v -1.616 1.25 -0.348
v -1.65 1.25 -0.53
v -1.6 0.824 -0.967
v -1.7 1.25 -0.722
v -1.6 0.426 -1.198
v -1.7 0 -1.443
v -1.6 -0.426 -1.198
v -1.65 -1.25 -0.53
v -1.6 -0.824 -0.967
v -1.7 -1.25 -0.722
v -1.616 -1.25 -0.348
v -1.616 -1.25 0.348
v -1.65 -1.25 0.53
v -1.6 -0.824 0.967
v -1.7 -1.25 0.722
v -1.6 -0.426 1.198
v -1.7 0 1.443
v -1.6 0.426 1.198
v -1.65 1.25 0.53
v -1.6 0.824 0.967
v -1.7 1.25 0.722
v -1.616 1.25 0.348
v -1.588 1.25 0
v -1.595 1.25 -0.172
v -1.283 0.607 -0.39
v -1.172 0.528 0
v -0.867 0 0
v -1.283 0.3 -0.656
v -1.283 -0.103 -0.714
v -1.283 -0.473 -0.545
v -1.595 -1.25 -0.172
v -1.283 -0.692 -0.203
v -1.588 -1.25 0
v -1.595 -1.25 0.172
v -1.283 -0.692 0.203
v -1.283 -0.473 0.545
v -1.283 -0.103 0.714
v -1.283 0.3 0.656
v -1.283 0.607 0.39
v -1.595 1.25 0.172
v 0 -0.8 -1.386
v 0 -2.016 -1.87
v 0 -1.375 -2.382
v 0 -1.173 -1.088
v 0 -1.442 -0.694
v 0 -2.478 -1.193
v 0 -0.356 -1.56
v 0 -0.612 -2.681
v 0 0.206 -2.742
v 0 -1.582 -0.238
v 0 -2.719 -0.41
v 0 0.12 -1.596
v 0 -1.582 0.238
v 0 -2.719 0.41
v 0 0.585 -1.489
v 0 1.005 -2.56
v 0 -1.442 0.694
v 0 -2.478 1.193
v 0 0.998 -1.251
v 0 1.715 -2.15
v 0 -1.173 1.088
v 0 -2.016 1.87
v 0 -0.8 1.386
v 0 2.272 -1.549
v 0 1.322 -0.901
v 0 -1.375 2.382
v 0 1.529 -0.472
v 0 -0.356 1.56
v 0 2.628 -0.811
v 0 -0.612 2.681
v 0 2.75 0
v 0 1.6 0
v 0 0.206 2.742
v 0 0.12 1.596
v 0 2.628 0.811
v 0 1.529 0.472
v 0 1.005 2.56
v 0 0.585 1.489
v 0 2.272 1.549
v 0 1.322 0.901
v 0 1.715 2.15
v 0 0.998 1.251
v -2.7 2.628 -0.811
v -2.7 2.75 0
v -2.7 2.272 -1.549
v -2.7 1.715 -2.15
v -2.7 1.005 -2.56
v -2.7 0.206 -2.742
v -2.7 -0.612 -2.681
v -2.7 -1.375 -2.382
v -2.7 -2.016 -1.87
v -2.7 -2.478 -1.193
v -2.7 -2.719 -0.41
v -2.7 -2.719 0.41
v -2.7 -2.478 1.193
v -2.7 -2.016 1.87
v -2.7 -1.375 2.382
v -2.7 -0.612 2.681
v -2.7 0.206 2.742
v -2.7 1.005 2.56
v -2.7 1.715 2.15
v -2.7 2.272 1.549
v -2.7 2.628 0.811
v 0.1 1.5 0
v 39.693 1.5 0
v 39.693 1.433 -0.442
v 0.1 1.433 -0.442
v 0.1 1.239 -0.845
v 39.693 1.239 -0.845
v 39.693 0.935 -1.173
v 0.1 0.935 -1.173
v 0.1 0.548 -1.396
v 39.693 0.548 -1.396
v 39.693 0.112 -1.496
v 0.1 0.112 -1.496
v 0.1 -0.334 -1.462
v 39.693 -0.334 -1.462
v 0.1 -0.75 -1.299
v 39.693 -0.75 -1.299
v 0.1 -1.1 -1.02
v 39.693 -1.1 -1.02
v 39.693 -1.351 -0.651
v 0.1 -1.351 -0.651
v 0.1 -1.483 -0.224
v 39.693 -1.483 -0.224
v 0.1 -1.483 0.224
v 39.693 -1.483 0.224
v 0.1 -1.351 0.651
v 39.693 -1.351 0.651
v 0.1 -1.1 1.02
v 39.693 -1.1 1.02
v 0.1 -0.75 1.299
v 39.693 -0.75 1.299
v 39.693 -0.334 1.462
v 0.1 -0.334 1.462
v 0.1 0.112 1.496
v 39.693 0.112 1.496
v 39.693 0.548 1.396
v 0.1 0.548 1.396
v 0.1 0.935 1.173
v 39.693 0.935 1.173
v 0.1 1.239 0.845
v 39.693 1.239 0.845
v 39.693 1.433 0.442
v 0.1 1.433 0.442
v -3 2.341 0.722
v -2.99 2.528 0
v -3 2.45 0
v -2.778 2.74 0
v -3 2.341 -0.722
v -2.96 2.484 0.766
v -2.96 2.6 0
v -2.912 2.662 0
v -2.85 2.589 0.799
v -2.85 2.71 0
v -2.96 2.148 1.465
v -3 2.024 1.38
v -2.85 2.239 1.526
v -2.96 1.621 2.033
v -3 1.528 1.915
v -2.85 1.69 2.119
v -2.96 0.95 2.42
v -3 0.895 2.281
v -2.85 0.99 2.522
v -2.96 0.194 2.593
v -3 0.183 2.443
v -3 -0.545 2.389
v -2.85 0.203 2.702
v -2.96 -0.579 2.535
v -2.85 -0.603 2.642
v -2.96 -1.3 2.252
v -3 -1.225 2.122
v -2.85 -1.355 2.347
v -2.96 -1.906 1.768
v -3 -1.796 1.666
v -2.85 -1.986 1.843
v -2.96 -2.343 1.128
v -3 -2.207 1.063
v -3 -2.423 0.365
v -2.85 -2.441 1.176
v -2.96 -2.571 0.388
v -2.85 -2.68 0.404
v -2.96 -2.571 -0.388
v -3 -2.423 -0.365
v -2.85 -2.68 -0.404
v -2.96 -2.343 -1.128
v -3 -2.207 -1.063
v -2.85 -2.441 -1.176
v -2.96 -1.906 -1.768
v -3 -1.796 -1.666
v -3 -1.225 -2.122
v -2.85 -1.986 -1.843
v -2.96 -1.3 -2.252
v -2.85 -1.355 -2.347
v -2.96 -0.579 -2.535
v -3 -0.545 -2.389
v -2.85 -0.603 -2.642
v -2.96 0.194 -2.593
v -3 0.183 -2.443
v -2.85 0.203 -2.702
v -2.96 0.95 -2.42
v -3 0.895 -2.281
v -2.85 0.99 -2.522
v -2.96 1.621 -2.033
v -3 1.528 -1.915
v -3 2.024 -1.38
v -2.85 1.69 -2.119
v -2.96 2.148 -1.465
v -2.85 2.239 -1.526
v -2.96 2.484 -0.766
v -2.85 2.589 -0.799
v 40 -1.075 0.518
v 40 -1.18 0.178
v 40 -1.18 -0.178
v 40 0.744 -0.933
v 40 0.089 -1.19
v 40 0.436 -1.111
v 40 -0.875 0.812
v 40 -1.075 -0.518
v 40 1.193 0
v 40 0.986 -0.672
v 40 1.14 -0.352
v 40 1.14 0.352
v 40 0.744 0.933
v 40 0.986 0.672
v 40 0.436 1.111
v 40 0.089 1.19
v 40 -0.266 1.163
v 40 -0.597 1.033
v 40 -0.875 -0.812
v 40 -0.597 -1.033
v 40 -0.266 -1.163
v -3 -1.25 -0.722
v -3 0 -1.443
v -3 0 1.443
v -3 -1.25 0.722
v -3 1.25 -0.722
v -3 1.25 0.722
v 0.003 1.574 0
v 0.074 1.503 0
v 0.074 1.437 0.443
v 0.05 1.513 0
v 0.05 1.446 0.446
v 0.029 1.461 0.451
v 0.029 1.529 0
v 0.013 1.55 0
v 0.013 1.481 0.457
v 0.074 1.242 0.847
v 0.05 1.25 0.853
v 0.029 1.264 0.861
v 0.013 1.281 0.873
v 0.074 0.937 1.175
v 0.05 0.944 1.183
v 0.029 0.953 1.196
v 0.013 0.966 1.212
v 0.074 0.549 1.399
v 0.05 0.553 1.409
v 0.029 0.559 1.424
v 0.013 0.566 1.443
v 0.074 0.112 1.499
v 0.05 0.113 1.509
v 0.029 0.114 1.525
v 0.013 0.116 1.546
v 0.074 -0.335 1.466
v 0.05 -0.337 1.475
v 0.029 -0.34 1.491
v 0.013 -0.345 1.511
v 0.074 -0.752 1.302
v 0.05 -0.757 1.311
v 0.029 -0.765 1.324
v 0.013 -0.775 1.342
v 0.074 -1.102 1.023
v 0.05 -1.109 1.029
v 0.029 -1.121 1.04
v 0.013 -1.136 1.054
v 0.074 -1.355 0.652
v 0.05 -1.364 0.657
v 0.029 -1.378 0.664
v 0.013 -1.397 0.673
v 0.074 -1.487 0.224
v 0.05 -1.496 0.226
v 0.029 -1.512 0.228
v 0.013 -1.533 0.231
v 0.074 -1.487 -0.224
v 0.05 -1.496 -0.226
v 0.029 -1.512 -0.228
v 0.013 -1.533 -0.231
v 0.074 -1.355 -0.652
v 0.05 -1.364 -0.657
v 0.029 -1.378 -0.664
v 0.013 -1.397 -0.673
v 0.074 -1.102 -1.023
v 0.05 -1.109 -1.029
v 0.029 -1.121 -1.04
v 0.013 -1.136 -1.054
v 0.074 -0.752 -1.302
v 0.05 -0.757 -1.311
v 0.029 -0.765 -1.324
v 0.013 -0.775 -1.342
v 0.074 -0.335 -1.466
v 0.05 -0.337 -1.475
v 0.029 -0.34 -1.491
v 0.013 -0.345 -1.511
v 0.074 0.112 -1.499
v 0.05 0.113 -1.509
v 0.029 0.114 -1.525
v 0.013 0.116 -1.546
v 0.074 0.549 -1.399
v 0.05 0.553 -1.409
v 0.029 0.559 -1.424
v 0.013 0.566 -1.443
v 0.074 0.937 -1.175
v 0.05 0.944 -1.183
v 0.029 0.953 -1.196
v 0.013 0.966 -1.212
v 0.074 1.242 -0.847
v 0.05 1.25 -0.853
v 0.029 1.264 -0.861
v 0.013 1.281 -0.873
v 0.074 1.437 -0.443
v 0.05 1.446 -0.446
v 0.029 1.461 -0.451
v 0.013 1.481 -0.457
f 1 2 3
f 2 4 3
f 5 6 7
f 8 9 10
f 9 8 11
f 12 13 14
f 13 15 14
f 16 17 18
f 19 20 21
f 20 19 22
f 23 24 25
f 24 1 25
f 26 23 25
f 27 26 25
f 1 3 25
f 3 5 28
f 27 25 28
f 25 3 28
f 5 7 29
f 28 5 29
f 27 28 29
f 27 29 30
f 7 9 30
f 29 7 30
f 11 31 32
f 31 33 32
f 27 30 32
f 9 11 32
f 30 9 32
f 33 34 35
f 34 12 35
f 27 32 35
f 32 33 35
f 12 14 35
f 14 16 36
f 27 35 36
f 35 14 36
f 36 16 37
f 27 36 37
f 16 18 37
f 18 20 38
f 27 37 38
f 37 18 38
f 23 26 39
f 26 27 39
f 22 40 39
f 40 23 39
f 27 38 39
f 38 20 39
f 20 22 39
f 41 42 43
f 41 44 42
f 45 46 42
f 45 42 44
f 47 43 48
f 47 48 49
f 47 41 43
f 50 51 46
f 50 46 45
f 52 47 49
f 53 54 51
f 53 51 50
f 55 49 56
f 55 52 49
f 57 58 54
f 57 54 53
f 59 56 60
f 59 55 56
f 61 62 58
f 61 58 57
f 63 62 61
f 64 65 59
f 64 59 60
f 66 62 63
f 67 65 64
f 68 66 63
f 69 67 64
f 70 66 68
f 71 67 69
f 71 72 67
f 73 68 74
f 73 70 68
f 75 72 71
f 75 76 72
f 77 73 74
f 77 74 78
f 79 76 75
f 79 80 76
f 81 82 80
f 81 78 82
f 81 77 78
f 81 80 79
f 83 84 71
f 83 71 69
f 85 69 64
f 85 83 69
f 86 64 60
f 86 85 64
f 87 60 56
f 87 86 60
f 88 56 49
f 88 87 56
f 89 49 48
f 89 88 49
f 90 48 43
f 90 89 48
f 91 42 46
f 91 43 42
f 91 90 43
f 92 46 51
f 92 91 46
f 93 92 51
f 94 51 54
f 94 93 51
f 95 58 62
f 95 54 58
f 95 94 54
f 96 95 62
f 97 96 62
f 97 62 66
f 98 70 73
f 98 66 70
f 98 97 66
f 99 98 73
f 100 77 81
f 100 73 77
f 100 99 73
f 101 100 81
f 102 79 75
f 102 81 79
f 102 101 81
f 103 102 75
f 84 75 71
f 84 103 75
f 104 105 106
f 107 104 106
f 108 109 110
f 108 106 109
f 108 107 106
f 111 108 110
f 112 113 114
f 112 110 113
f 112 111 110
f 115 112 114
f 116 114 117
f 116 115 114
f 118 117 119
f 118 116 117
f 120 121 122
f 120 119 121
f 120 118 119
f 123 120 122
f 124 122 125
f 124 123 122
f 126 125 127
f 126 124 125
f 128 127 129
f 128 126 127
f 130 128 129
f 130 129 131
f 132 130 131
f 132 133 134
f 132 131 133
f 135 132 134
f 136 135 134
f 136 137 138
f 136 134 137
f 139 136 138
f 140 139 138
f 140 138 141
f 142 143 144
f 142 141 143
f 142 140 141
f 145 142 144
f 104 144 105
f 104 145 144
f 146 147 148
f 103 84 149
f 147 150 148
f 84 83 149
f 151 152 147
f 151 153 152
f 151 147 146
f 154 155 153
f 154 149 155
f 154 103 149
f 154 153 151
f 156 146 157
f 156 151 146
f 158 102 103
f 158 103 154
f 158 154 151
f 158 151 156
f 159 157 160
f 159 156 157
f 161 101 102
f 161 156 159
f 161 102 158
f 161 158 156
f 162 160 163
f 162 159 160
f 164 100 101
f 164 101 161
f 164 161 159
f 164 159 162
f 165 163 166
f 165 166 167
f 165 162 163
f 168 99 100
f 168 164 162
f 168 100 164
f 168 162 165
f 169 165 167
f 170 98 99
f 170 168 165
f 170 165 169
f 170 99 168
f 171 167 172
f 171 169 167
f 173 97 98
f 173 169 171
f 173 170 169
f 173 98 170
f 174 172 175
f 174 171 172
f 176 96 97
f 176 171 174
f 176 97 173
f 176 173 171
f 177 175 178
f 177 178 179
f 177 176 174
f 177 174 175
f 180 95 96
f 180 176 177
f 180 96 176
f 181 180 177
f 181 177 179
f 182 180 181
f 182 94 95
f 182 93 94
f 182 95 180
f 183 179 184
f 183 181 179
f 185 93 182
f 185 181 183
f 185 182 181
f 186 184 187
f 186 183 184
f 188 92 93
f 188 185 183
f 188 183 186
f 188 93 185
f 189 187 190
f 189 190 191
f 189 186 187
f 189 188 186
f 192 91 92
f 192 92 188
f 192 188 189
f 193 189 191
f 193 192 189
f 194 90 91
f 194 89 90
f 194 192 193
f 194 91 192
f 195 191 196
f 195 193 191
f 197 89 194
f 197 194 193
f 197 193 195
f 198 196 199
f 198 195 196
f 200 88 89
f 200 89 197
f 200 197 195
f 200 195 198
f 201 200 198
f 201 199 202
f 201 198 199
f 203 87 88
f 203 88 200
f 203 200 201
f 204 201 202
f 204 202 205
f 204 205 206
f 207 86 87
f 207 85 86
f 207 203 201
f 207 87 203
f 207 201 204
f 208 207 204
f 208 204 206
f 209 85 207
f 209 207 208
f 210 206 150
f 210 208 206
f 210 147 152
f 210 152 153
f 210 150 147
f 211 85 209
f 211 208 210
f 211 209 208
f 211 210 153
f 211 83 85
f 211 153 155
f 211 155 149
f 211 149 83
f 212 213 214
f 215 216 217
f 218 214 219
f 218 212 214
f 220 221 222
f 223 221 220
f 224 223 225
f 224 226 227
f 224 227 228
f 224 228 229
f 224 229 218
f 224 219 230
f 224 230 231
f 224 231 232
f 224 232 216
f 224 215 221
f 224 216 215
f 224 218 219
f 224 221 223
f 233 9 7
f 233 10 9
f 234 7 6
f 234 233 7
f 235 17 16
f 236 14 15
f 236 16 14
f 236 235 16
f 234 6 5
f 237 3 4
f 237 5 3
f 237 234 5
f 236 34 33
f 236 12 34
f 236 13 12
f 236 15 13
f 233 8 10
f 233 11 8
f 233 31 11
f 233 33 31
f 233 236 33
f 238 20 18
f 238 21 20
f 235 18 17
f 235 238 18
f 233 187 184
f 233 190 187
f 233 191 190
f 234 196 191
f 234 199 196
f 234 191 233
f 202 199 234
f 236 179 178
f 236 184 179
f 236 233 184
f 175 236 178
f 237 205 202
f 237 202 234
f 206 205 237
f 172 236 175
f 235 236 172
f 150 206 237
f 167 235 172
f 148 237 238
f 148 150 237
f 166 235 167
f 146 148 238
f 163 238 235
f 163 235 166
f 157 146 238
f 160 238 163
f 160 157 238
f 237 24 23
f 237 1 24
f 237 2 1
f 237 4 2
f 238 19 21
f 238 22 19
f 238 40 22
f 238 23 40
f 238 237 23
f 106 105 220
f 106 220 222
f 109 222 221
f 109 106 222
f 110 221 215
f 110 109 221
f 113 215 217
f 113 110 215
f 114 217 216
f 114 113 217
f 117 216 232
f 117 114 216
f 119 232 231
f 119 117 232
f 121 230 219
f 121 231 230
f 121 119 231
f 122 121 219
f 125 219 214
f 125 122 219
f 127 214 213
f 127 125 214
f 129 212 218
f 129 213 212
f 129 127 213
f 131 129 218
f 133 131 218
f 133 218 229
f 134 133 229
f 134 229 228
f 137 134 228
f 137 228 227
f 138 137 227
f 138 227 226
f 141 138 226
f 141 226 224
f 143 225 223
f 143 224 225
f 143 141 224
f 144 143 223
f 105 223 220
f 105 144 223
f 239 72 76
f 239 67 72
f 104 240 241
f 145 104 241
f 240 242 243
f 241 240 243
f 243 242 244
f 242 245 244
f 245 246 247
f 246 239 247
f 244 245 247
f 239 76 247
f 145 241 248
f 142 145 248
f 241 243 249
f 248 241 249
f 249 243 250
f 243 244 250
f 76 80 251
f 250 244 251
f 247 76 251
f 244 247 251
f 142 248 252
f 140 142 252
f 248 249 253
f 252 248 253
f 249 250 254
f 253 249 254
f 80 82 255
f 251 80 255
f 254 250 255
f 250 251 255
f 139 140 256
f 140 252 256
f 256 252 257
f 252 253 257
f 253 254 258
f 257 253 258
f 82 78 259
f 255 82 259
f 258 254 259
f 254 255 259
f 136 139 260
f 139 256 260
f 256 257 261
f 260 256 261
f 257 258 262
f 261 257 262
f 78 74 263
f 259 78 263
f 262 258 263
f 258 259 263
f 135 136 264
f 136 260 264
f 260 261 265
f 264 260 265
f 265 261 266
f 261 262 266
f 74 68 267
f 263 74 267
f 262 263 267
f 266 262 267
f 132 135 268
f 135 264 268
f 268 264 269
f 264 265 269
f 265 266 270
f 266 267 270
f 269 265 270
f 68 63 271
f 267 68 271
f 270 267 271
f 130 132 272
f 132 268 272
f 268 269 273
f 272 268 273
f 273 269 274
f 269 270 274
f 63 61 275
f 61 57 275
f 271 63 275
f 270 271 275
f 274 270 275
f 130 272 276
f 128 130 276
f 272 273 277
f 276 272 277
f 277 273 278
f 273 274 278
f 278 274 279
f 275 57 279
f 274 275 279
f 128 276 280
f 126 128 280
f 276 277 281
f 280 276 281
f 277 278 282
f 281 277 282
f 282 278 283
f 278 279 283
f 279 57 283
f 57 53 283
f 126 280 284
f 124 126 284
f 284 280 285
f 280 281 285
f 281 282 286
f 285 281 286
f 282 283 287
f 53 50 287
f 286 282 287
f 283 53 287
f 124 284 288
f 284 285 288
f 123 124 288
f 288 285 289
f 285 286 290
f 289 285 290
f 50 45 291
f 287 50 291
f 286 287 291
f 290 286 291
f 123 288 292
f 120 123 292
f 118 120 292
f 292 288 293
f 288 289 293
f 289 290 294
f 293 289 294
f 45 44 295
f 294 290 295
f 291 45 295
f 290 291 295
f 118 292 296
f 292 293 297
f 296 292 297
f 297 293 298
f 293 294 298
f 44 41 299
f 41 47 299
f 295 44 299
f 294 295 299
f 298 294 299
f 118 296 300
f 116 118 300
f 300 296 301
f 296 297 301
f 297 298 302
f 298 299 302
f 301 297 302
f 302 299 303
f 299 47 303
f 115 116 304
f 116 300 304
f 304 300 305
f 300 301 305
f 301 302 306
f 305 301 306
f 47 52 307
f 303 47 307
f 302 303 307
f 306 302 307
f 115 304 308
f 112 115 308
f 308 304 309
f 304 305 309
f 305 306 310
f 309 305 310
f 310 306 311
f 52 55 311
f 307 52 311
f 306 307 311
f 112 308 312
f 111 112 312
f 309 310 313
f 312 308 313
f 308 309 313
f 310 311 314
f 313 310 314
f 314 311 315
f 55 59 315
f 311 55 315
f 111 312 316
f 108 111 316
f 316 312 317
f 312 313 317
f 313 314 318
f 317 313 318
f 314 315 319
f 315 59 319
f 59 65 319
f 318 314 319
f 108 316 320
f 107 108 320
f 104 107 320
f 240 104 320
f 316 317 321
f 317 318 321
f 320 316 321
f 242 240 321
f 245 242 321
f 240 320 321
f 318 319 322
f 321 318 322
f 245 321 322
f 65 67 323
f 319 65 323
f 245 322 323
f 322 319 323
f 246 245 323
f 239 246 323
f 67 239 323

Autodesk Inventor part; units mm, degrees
ref_plane "YZ Plane" through (0, 0, 0) normal (1, 0, 0) x (0, 1, 0)
ref_plane "XZ Plane" through (0, 0, 0) normal (0, 1, 0) x (-1, 0, 0)
sketch "Sketch1" plane through (0, 0, 0) normal (0, 0, 1) x (1, 0, 0)
  line L0 (-0.8667, 0) -> (40, 0)
  line L1 (40, 0) -> (40, 1.5)
  line L2 (40, 1.5) -> (33.25, 1.5)
  line L3 (33.25, 1.5) -> (32.9432, 1.5)
  line L4 (32.9432, 1.5) -> (0, 1.5)
  line L5 (0, 1.5) -> (0, 2.75)
  line L6 (0, 2.75) -> (-3, 2.75)
  line L7 (-3, 2.75) -> (-3, 1.4434)
  line L8 (-3, 1.4434) -> (-1.7, 1.4434)
  line L9 (-1.7, 1.4434) -> (-0.8667, 0)
  line L10 (-11.6, 0) -> (48.6, 0) projected
  line L11 (0, -0.55) -> (0, 3.3) projected
  line L12 (33.25, 1.5) -> (0, 1.5) construction
  dimension "d1" = 6.75
  dimension "d2" = 0.3068
  dimension "d3" = 3
  dimension "d4" = 1.3
  dimension "d5" = 60
  dimension "d6" = 3
  dimension "d7" = 3
  dimension "d8" = 2.8868
  dimension "d9" = 5.5
  dimension "d26" = 40
revolve "Body" add sketch "Sketch1" angle 360 about axis through (-0.8667, 0, 0) along (1, 0, 0)
sketch "Sketch2" plane through (-3, 0, 0) normal (-1, 0, 0) x (0, 0, 1)
  circle A0 centre (0, 0) radius 1.4434 projected
  line L0 (0, -3.85) -> (0, 3.85) projected
  line L1 (-3.85, 0) -> (3.85, 0) projected
  line L2 (1.4434, 0) -> (0.7217, -1.25)
  line L3 (0.7217, -1.25) -> (-0.7217, -1.25)
  line L4 (-0.7217, -1.25) -> (-1.4434, 0)
  line L5 (-1.4434, 0) -> (-0.7217, 1.25)
  line L6 (-0.7217, 1.25) -> (0.7217, 1.25)
  line L7 (0.7217, 1.25) -> (1.4434, 0)
extrude "Slot" add sketch "Sketch2" against normal up to next contours L7 A0 | A0 L2 | L6 L0 A0 | A0 L0 L3 | L0 L6 A0 | A0 L3 L0 | L4 A0 | A0 L5
fillet "Fillet1" radius 0.3 1 edges at (-3, -2.75, 0)
thread "Thread" size "M3x0.5" class "6g" standard "ISO Metric profile" length 6.75
chamfer "Chamfer1" distance 0.3067 distance2 0.3067 1 edges at (40, -1.5, 0) measured on face at (40, -0.1088, 0.5667)
ref_plane "Work Plane1" through (29, 0, 0) normal (0, -1, 0) x (1, 0, 0)
fillet "Fillet2" radius 0.1 1 edges at (0, -1.5, 0)
equation "\"d1\" = GEL"
equation "\"d3\" = KOH"
equation "\"d4\" = INTI"
equation "\"d6\" = GD"
equation "\"d7\" = BDM"
equation "\"d8\" = 1.1547 * SW"
equation "\"d9\" = KOD"
equation "\"d30\" = R"
equation "\"d17\" = RR"
equation "\"d13\" = GEL"
equation "\"d15\" = -0.5 * SPD + 0.5 * GD"
equation "\"d16\" = GUL"
equation "\"GD\" = NND"
equation "\"NLG\" = 8"
equation "\"GEL\" = 6.75"
equation "\"KOD\" = 5.5"
equation "\"KOH\" = NND"
equation "\"INTI\" = 1.3"
equation "\"GAL\" = 0.61345 * PTC"
equation "\"GUL\" = 0.61345 * PTC"
equation "\"BDM\" = NND"
equation "\"SW\" = 2.5"
equation "\"RR\" = 0.1 * NND"
equation "\"SPD\" = NND - 1.2269 * PTC"
equation "\"R\" = 0.1"
equation "\"PHH\" = 0.13"
equation "\"GD1\" = THREADDIA - 1.2269 * PTC"
equation "\"THREADDIA\" = 3"
equation "\"FAWI\" = 45deg"
equation "\"PTC\" = 0.5"
equation "\"KOH1\" = 2.7"
equation "\"NND\" = 3"
equation "\"TOA\" = 30deg"
equation "\"E0\" = 1.155 * SW"
properties part number "AS 1420 - 1973 - M3 x 8" material "Steel, Mild"
